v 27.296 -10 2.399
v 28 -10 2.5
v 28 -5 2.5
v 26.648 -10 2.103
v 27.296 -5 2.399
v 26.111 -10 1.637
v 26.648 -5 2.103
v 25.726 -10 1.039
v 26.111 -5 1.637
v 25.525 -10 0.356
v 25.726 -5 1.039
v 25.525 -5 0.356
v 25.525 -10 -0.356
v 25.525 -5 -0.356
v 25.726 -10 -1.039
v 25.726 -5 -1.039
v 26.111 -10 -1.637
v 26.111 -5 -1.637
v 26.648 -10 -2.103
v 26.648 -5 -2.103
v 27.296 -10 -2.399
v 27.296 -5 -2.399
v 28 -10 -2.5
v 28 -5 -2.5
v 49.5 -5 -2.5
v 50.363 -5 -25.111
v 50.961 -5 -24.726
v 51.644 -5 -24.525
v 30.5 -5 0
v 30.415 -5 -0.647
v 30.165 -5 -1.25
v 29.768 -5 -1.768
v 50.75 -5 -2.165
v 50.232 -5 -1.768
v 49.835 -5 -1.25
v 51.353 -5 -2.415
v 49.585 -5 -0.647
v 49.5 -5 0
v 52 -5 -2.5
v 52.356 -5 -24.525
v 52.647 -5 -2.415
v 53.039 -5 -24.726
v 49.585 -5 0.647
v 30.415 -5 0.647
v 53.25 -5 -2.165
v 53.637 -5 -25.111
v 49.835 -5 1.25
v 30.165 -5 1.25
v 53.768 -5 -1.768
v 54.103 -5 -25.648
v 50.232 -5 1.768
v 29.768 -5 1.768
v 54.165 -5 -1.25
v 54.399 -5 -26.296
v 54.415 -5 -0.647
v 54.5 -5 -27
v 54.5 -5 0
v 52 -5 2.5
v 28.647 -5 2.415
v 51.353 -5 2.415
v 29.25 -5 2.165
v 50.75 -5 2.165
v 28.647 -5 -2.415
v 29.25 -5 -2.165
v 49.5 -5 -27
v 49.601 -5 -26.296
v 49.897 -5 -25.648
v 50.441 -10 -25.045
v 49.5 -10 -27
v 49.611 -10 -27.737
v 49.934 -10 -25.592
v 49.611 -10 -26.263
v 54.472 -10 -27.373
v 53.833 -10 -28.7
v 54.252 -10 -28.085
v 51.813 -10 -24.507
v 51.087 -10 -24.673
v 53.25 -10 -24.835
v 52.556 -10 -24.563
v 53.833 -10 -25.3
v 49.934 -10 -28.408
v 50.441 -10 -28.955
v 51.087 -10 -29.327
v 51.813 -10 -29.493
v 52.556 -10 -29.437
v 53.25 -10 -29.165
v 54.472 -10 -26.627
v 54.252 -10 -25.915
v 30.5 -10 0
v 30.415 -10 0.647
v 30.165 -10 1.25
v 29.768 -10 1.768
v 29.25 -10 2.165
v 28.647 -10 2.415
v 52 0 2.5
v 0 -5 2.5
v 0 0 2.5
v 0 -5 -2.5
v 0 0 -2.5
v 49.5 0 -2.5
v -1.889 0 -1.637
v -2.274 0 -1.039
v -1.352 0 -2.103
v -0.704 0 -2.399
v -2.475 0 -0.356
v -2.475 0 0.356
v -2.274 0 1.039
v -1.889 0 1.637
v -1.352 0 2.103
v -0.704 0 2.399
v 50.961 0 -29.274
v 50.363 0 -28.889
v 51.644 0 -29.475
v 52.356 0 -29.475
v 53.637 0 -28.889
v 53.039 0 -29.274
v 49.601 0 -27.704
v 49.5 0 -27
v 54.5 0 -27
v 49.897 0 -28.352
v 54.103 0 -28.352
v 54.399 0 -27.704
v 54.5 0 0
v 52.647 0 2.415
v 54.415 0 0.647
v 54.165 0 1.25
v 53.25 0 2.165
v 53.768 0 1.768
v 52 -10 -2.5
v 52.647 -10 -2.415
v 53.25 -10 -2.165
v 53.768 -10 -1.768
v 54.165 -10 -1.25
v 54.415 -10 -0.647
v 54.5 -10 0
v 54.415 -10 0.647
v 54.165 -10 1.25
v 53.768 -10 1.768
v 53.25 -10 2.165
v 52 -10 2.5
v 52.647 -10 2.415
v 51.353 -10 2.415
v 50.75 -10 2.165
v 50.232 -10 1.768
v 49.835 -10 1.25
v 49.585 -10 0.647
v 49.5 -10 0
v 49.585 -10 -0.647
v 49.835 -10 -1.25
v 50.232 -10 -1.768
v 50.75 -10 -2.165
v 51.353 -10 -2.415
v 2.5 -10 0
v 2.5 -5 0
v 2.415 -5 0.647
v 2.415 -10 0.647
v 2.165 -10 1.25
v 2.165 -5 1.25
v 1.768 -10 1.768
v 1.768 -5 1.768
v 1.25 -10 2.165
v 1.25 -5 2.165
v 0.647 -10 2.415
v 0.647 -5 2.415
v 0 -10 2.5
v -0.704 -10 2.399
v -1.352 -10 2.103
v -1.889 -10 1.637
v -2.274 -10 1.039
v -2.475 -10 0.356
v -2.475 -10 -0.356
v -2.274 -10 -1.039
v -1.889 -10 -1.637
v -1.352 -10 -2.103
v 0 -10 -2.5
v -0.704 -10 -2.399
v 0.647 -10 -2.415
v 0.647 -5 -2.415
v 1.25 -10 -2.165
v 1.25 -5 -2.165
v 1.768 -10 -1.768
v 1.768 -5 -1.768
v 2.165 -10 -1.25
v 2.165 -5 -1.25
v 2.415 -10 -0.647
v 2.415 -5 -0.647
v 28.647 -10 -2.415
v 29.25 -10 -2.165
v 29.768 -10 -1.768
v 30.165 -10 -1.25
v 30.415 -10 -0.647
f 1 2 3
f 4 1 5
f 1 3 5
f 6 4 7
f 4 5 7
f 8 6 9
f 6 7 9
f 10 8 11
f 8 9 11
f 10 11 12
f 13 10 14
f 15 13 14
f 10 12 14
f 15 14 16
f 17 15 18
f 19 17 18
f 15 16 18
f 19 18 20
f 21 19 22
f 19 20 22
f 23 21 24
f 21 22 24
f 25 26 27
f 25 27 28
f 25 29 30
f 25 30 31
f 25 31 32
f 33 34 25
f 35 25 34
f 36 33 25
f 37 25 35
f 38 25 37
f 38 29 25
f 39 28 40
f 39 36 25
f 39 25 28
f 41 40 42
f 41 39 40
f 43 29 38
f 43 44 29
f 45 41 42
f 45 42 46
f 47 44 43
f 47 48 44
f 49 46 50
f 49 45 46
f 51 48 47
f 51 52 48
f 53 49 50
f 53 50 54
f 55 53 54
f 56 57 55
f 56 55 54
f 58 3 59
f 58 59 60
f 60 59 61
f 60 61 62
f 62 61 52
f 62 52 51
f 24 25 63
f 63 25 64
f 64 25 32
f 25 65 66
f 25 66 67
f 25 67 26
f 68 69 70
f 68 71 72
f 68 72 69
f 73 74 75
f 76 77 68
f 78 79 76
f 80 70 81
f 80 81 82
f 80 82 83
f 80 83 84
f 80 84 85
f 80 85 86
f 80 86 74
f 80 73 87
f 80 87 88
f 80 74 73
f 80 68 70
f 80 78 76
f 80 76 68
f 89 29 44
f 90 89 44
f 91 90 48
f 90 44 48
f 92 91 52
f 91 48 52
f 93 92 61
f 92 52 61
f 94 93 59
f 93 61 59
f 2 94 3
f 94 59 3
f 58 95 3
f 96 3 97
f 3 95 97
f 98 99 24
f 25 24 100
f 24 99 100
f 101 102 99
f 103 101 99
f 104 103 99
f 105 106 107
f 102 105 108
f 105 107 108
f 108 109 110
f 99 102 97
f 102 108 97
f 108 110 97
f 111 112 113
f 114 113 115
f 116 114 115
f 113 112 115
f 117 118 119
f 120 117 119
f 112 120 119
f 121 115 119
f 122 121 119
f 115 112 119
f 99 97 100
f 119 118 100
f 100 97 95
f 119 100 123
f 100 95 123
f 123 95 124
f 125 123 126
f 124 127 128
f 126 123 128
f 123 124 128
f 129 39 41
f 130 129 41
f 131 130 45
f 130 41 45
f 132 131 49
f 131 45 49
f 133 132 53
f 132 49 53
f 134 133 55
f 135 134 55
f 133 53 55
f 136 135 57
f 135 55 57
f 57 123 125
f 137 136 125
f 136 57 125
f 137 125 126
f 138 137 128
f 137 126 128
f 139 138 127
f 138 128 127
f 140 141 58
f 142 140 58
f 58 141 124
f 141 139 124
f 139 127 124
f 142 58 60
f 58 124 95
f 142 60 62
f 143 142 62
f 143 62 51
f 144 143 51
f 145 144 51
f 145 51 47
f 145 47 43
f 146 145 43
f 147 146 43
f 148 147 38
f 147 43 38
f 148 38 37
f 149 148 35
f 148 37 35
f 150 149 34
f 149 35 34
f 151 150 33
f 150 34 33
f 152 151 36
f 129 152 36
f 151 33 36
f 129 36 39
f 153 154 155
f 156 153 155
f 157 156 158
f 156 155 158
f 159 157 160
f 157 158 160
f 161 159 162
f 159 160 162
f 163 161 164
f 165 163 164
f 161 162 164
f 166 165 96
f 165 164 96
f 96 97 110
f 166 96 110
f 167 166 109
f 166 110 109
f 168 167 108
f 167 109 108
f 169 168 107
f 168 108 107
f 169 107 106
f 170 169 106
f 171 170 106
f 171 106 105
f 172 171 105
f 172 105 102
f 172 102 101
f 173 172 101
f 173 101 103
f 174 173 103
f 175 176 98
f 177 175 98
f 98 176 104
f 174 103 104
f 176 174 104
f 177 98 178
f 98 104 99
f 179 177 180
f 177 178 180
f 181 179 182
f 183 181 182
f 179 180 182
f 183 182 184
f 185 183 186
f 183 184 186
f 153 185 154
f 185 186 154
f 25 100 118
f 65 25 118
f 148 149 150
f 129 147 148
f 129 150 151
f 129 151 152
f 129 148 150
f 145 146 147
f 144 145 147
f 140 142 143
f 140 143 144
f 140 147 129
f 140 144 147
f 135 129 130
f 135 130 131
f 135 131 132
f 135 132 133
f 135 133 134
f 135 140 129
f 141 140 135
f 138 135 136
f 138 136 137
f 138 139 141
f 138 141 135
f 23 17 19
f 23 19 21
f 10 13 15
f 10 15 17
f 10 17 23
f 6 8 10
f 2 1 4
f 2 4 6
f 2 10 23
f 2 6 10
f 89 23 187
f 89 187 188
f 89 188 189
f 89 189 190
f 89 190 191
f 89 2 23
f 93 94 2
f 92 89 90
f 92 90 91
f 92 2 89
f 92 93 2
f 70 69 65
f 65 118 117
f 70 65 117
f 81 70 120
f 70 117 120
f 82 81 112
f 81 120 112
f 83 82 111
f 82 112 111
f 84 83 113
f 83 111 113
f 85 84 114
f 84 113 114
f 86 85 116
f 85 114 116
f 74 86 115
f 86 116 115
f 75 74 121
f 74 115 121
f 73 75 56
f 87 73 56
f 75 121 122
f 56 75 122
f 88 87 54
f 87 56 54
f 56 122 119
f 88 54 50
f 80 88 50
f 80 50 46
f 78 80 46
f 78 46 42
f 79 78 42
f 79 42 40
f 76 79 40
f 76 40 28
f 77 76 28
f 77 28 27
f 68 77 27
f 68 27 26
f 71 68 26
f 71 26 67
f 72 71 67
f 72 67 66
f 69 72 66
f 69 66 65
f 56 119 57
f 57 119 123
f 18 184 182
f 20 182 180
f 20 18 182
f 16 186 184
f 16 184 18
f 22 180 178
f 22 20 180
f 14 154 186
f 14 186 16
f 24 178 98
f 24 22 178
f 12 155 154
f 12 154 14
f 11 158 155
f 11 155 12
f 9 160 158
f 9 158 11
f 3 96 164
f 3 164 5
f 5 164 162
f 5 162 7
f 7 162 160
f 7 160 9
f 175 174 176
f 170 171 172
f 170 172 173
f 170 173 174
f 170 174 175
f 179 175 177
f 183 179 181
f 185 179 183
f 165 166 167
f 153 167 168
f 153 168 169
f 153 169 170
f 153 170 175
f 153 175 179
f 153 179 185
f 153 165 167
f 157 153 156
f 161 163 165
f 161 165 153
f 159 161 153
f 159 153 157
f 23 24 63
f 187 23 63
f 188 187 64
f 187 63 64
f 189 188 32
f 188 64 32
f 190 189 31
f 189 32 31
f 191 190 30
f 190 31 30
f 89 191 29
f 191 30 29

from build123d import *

# Parameters (mm, degrees)
F1_DEPTH = 5
F2_DEPTH = 10


with BuildPart() as f1:
    # F0 (on Front) → F1 (new body)
    with BuildSketch(Plane.XZ):
        with BuildLine():
            ThreePointArc((0, -2.5), (1.767766953, -1.767766953), (2.5, 0))
            ThreePointArc((2.5, 0), (1.767766953, 1.767766953), (0, 2.5))
            Line((0, 2.5), (0, -2.5))
        make_face()
        with BuildLine():
            ThreePointArc((0, 2.5), (1.767766953, 1.767766953), (2.5, 0))
            ThreePointArc((2.5, 0), (1.767766953, -1.767766953), (0, -2.5))
            Line((0, -2.5), (28, -2.5))
            ThreePointArc((28, -2.5), (25.5, 0), (28, 2.5))
            Line((28, 2.5), (0, 2.5))
        make_face()
        with BuildLine():
            Line((0, -2.5), (0, 2.5))
            ThreePointArc((0, 2.5), (-2.5, 0), (0, -2.5))
        make_face()
        with BuildLine():
            Line((52, 2.5), (28, 2.5))
            ThreePointArc((28, 2.5), (29.767766953, 1.767766953), (30.5, 0))
            ThreePointArc((30.5, 0), (29.767766953, -1.767766953), (28, -2.5))
            Line((28, -2.5), (49.5, -2.5))
            Line((49.5, -2.5), (49.5, 0))
            ThreePointArc((49.5, 0), (50.232233047, 1.767766953), (52, 2.5))
        make_face()
        with BuildLine():
            ThreePointArc((30.5, 0), (29.767766953, 1.767766953), (28, 2.5))
            ThreePointArc((28, 2.5), (25.5, 0), (28, -2.5))
            ThreePointArc((28, -2.5), (29.767766953, -1.767766953), (30.5, 0))
        make_face()
        with BuildLine():
            Line((52, 0), (52, 2.5))
            ThreePointArc((52, 2.5), (50.232233047, 1.767766953), (49.5, 0))
            Line((49.5, 0), (52, 0))
        make_face()
        with BuildLine():
            ThreePointArc((54.5, 0), (53.767766953, 1.767766953), (52, 2.5))
            Line((52, 2.5), (52, 0))
            Line((52, 0), (54.5, 0))
        make_face()
        with BuildLine():
            Line((49.5, 0), (49.5, -2.5))
            Line((49.5, -2.5), (52, -2.5))
            ThreePointArc((52, -2.5), (50.232233047, -1.767766953), (49.5, 0))
        make_face()
        with BuildLine():
            Line((52, -2.5), (49.5, -2.5))
            Line((49.5, -2.5), (49.5, -27))
            ThreePointArc((49.5, -27), (52, -24.5), (54.5, -27))
            Line((54.5, -27), (54.5, 0))
            ThreePointArc((54.5, 0), (53.767766953, -1.767766953), (52, -2.5))
        make_face()
        with BuildLine():
            ThreePointArc((52, -2.5), (53.767766953, -1.767766953), (54.5, 0))
            Line((54.5, 0), (52, 0))
            Line((52, 0), (52, -2.5))
        make_face()
        with BuildLine():
            Line((54.5, -27), (49.5, -27))
            ThreePointArc((49.5, -27), (52, -29.5), (54.5, -27))
        make_face()
        with BuildLine():
            ThreePointArc((54.5, -27), (52, -24.5), (49.5, -27))
            Line((49.5, -27), (54.5, -27))
        make_face()
        with BuildLine():
            Line((52, 0), (49.5, 0))
            ThreePointArc((49.5, 0), (50.232233047, -1.767766953), (52, -2.5))
            Line((52, -2.5), (52, 0))
        make_face()
    extrude(amount=F1_DEPTH)

    # F0 (on Front) → F2 (join)
    with BuildSketch(Plane.XZ):
        with BuildLine():
            ThreePointArc((0, -2.5), (1.767766953, -1.767766953), (2.5, 0))
            ThreePointArc((2.5, 0), (1.767766953, 1.767766953), (0, 2.5))
            Line((0, 2.5), (0, -2.5))
        make_face()
        with BuildLine():
            Line((0, -2.5), (0, 2.5))
            ThreePointArc((0, 2.5), (-2.5, 0), (0, -2.5))
        make_face()
        with BuildLine():
            ThreePointArc((30.5, 0), (29.767766953, 1.767766953), (28, 2.5))
            ThreePointArc((28, 2.5), (25.5, 0), (28, -2.5))
            ThreePointArc((28, -2.5), (29.767766953, -1.767766953), (30.5, 0))
        make_face()
        with BuildLine():
            Line((52, 0), (49.5, 0))
            ThreePointArc((49.5, 0), (50.232233047, -1.767766953), (52, -2.5))
            Line((52, -2.5), (52, 0))
        make_face()
        with BuildLine():
            ThreePointArc((52, -2.5), (53.767766953, -1.767766953), (54.5, 0))
            Line((54.5, 0), (52, 0))
            Line((52, 0), (52, -2.5))
        make_face()
        with BuildLine():
            ThreePointArc((54.5, 0), (53.767766953, 1.767766953), (52, 2.5))
            Line((52, 2.5), (52, 0))
            Line((52, 0), (54.5, 0))
        make_face()
        with BuildLine():
            Line((52, 0), (52, 2.5))
            ThreePointArc((52, 2.5), (50.232233047, 1.767766953), (49.5, 0))
            Line((49.5, 0), (52, 0))
        make_face()
        with BuildLine():
            ThreePointArc((54.5, -27), (52, -24.5), (49.5, -27))
            Line((49.5, -27), (54.5, -27))
        make_face()
        with BuildLine():
            Line((54.5, -27), (49.5, -27))
            ThreePointArc((49.5, -27), (52, -29.5), (54.5, -27))
        make_face()
    extrude(amount=F2_DEPTH)


solid = f1.part
